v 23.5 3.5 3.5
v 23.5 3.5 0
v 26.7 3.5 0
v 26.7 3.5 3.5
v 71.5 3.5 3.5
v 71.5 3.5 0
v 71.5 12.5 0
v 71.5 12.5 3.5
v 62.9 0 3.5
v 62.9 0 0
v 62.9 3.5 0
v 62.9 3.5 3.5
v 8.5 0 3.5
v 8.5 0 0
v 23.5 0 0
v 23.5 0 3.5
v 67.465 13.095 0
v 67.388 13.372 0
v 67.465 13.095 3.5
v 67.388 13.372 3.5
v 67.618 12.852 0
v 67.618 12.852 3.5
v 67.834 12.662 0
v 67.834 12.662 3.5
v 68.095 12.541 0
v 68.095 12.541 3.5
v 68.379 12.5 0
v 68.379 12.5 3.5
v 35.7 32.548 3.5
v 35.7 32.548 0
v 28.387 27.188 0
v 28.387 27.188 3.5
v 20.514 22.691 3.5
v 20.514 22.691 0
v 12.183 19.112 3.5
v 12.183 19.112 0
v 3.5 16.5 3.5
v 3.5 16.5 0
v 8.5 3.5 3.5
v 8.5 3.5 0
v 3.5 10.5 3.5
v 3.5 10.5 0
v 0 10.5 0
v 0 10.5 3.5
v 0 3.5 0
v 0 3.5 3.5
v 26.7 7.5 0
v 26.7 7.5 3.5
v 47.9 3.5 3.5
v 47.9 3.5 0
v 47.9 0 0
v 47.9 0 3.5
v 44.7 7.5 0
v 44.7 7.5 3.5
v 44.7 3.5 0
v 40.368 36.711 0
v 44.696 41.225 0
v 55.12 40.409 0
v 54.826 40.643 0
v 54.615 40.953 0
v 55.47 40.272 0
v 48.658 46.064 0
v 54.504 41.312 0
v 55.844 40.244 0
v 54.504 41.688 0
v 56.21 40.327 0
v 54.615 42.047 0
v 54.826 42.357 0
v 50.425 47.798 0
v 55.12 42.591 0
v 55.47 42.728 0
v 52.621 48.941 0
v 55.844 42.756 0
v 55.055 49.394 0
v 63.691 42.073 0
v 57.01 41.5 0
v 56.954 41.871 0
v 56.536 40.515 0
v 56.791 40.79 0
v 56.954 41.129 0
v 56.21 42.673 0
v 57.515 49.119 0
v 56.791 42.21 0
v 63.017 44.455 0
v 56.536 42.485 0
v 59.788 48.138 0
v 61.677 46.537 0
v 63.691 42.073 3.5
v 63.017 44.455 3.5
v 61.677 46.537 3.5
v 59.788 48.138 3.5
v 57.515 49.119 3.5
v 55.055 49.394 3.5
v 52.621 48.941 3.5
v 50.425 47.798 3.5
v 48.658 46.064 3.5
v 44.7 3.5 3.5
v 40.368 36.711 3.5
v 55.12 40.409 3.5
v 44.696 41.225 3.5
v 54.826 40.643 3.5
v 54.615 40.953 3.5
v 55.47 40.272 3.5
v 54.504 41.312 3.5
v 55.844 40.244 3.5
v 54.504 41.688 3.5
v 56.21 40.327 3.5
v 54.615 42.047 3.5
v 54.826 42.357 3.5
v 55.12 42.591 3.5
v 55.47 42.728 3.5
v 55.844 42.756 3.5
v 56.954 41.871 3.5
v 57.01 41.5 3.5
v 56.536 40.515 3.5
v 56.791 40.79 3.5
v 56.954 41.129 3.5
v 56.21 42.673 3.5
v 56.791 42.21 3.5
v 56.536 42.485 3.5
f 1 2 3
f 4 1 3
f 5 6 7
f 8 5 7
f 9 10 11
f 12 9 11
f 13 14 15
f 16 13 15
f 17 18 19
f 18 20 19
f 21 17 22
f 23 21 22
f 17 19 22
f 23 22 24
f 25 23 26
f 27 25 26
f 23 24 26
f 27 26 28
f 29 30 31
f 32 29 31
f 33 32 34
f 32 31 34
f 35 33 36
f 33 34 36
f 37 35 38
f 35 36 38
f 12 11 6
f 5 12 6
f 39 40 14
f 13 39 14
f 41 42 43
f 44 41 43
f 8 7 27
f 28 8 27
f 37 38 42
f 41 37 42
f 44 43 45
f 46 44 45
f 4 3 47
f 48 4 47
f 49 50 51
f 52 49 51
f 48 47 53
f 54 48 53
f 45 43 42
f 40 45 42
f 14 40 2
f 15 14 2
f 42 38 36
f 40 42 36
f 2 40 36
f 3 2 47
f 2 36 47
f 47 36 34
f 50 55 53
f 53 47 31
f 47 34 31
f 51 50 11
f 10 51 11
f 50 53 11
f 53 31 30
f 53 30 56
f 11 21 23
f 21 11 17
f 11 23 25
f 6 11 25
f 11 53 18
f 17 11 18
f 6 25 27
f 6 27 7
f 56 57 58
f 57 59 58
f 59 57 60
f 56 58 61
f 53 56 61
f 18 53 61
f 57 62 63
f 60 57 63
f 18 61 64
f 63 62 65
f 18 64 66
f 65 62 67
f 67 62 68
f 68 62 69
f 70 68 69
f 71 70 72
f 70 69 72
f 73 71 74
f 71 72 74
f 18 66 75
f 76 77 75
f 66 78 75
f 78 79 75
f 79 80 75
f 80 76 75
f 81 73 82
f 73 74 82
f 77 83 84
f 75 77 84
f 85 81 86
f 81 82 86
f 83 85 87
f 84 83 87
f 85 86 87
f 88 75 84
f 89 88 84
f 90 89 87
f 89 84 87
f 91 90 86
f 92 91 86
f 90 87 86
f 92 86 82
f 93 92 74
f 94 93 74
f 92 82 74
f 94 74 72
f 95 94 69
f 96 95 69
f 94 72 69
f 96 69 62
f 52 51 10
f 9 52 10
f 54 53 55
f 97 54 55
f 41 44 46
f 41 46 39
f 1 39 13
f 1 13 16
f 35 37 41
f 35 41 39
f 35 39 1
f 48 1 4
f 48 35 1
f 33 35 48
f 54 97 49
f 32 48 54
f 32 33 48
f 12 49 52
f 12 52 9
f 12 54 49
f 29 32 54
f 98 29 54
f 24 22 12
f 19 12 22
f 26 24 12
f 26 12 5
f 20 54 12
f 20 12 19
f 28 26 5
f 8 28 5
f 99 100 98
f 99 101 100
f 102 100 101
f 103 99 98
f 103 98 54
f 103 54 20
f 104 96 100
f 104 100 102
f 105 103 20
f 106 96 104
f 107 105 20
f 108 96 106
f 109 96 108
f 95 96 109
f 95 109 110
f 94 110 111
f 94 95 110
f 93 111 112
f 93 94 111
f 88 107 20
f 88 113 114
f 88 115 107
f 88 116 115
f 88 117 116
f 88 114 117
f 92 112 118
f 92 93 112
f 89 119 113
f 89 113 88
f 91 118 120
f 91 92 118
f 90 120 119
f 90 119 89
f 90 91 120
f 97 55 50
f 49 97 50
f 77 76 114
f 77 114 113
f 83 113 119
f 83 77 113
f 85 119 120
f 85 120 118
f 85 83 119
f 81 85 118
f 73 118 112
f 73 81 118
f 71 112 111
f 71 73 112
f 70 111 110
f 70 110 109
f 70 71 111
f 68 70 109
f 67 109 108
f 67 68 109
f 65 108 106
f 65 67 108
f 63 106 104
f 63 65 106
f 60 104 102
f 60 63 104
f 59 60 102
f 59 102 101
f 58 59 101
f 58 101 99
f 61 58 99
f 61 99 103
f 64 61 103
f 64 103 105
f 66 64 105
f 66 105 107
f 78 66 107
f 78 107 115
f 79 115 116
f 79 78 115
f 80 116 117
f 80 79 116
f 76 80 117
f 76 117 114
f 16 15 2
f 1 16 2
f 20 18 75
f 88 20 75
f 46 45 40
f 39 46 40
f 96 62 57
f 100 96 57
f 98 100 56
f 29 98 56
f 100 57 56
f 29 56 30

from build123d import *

# Parameters (mm, degrees)
SKETCH1_R           = 1.26
BOSS_EXTRUDE1_DEPTH = 3.5
FILLET1_R           = 1


with BuildPart() as part:
    # Sketch1 → Boss-Extrude1 (new body)
    # profile 1 of 2: a face of its own
    with BuildSketch(Plane.XY):
        with BuildLine():
            Line((3.5, 10.5), (0, 10.5))
            Line((0, 10.5), (0, 3.5))
            Line((0, 3.5), (8.5, 3.5))
            Line((8.5, 3.5), (8.5, 0))
            Line((8.5, 0), (23.5, 0))
            Line((23.5, 0), (23.5, 3.5))
            Line((23.5, 3.5), (26.7, 3.5))
            Line((26.7, 3.5), (26.7, 7.5))
            Line((26.7, 7.5), (35.7, 7.5))
            Line((35.7, 7.5), (35.7, 32.54836019))
            ThreePointArc((35.7, 32.54836019), (20.513860835, 22.69057725), (3.5, 16.5))
            Line((3.5, 16.5), (3.5, 10.5))
        make_face()
    # profile 2 of 2: a face of its own
    with BuildSketch(Plane.XY):
        with BuildLine():
            ThreePointArc((48.657927336, 46.063814965), (42.575731037, 38.925687301), (35.7, 32.54836019))
            Line((35.7, 32.54836019), (35.7, 7.5))
            Line((35.7, 7.5), (44.7, 7.5))
            Line((44.7, 7.5), (44.7, 3.5))
            Line((44.7, 3.5), (47.9, 3.5))
            Line((47.9, 3.5), (47.9, 0))
            Line((47.9, 0), (62.9, 0))
            Line((62.9, 0), (62.9, 3.5))
            Line((62.9, 3.5), (71.5, 3.5))
            Line((71.5, 3.5), (71.5, 12.5))
            Line((71.5, 12.5), (67.5, 12.5))
            Line((67.5, 12.5), (63.691186196, 42.073003524))
            ThreePointArc((63.691186196, 42.073003524), (57.515260243, 49.118796295), (48.657927336, 46.063814965))
        make_face()
        with Locations((55.75, 41.5)):
            Circle(SKETCH1_R, mode=Mode.SUBTRACT)
    extrude(amount=BOSS_EXTRUDE1_DEPTH)

    # Fillet1
    fillet1_edges = [part.edges().sort_by_distance(p)[0] for p in [
        (67.5, 12.5, 1.75),
    ]]
    fillet(fillet1_edges, radius=FILLET1_R)


solid = part.part
